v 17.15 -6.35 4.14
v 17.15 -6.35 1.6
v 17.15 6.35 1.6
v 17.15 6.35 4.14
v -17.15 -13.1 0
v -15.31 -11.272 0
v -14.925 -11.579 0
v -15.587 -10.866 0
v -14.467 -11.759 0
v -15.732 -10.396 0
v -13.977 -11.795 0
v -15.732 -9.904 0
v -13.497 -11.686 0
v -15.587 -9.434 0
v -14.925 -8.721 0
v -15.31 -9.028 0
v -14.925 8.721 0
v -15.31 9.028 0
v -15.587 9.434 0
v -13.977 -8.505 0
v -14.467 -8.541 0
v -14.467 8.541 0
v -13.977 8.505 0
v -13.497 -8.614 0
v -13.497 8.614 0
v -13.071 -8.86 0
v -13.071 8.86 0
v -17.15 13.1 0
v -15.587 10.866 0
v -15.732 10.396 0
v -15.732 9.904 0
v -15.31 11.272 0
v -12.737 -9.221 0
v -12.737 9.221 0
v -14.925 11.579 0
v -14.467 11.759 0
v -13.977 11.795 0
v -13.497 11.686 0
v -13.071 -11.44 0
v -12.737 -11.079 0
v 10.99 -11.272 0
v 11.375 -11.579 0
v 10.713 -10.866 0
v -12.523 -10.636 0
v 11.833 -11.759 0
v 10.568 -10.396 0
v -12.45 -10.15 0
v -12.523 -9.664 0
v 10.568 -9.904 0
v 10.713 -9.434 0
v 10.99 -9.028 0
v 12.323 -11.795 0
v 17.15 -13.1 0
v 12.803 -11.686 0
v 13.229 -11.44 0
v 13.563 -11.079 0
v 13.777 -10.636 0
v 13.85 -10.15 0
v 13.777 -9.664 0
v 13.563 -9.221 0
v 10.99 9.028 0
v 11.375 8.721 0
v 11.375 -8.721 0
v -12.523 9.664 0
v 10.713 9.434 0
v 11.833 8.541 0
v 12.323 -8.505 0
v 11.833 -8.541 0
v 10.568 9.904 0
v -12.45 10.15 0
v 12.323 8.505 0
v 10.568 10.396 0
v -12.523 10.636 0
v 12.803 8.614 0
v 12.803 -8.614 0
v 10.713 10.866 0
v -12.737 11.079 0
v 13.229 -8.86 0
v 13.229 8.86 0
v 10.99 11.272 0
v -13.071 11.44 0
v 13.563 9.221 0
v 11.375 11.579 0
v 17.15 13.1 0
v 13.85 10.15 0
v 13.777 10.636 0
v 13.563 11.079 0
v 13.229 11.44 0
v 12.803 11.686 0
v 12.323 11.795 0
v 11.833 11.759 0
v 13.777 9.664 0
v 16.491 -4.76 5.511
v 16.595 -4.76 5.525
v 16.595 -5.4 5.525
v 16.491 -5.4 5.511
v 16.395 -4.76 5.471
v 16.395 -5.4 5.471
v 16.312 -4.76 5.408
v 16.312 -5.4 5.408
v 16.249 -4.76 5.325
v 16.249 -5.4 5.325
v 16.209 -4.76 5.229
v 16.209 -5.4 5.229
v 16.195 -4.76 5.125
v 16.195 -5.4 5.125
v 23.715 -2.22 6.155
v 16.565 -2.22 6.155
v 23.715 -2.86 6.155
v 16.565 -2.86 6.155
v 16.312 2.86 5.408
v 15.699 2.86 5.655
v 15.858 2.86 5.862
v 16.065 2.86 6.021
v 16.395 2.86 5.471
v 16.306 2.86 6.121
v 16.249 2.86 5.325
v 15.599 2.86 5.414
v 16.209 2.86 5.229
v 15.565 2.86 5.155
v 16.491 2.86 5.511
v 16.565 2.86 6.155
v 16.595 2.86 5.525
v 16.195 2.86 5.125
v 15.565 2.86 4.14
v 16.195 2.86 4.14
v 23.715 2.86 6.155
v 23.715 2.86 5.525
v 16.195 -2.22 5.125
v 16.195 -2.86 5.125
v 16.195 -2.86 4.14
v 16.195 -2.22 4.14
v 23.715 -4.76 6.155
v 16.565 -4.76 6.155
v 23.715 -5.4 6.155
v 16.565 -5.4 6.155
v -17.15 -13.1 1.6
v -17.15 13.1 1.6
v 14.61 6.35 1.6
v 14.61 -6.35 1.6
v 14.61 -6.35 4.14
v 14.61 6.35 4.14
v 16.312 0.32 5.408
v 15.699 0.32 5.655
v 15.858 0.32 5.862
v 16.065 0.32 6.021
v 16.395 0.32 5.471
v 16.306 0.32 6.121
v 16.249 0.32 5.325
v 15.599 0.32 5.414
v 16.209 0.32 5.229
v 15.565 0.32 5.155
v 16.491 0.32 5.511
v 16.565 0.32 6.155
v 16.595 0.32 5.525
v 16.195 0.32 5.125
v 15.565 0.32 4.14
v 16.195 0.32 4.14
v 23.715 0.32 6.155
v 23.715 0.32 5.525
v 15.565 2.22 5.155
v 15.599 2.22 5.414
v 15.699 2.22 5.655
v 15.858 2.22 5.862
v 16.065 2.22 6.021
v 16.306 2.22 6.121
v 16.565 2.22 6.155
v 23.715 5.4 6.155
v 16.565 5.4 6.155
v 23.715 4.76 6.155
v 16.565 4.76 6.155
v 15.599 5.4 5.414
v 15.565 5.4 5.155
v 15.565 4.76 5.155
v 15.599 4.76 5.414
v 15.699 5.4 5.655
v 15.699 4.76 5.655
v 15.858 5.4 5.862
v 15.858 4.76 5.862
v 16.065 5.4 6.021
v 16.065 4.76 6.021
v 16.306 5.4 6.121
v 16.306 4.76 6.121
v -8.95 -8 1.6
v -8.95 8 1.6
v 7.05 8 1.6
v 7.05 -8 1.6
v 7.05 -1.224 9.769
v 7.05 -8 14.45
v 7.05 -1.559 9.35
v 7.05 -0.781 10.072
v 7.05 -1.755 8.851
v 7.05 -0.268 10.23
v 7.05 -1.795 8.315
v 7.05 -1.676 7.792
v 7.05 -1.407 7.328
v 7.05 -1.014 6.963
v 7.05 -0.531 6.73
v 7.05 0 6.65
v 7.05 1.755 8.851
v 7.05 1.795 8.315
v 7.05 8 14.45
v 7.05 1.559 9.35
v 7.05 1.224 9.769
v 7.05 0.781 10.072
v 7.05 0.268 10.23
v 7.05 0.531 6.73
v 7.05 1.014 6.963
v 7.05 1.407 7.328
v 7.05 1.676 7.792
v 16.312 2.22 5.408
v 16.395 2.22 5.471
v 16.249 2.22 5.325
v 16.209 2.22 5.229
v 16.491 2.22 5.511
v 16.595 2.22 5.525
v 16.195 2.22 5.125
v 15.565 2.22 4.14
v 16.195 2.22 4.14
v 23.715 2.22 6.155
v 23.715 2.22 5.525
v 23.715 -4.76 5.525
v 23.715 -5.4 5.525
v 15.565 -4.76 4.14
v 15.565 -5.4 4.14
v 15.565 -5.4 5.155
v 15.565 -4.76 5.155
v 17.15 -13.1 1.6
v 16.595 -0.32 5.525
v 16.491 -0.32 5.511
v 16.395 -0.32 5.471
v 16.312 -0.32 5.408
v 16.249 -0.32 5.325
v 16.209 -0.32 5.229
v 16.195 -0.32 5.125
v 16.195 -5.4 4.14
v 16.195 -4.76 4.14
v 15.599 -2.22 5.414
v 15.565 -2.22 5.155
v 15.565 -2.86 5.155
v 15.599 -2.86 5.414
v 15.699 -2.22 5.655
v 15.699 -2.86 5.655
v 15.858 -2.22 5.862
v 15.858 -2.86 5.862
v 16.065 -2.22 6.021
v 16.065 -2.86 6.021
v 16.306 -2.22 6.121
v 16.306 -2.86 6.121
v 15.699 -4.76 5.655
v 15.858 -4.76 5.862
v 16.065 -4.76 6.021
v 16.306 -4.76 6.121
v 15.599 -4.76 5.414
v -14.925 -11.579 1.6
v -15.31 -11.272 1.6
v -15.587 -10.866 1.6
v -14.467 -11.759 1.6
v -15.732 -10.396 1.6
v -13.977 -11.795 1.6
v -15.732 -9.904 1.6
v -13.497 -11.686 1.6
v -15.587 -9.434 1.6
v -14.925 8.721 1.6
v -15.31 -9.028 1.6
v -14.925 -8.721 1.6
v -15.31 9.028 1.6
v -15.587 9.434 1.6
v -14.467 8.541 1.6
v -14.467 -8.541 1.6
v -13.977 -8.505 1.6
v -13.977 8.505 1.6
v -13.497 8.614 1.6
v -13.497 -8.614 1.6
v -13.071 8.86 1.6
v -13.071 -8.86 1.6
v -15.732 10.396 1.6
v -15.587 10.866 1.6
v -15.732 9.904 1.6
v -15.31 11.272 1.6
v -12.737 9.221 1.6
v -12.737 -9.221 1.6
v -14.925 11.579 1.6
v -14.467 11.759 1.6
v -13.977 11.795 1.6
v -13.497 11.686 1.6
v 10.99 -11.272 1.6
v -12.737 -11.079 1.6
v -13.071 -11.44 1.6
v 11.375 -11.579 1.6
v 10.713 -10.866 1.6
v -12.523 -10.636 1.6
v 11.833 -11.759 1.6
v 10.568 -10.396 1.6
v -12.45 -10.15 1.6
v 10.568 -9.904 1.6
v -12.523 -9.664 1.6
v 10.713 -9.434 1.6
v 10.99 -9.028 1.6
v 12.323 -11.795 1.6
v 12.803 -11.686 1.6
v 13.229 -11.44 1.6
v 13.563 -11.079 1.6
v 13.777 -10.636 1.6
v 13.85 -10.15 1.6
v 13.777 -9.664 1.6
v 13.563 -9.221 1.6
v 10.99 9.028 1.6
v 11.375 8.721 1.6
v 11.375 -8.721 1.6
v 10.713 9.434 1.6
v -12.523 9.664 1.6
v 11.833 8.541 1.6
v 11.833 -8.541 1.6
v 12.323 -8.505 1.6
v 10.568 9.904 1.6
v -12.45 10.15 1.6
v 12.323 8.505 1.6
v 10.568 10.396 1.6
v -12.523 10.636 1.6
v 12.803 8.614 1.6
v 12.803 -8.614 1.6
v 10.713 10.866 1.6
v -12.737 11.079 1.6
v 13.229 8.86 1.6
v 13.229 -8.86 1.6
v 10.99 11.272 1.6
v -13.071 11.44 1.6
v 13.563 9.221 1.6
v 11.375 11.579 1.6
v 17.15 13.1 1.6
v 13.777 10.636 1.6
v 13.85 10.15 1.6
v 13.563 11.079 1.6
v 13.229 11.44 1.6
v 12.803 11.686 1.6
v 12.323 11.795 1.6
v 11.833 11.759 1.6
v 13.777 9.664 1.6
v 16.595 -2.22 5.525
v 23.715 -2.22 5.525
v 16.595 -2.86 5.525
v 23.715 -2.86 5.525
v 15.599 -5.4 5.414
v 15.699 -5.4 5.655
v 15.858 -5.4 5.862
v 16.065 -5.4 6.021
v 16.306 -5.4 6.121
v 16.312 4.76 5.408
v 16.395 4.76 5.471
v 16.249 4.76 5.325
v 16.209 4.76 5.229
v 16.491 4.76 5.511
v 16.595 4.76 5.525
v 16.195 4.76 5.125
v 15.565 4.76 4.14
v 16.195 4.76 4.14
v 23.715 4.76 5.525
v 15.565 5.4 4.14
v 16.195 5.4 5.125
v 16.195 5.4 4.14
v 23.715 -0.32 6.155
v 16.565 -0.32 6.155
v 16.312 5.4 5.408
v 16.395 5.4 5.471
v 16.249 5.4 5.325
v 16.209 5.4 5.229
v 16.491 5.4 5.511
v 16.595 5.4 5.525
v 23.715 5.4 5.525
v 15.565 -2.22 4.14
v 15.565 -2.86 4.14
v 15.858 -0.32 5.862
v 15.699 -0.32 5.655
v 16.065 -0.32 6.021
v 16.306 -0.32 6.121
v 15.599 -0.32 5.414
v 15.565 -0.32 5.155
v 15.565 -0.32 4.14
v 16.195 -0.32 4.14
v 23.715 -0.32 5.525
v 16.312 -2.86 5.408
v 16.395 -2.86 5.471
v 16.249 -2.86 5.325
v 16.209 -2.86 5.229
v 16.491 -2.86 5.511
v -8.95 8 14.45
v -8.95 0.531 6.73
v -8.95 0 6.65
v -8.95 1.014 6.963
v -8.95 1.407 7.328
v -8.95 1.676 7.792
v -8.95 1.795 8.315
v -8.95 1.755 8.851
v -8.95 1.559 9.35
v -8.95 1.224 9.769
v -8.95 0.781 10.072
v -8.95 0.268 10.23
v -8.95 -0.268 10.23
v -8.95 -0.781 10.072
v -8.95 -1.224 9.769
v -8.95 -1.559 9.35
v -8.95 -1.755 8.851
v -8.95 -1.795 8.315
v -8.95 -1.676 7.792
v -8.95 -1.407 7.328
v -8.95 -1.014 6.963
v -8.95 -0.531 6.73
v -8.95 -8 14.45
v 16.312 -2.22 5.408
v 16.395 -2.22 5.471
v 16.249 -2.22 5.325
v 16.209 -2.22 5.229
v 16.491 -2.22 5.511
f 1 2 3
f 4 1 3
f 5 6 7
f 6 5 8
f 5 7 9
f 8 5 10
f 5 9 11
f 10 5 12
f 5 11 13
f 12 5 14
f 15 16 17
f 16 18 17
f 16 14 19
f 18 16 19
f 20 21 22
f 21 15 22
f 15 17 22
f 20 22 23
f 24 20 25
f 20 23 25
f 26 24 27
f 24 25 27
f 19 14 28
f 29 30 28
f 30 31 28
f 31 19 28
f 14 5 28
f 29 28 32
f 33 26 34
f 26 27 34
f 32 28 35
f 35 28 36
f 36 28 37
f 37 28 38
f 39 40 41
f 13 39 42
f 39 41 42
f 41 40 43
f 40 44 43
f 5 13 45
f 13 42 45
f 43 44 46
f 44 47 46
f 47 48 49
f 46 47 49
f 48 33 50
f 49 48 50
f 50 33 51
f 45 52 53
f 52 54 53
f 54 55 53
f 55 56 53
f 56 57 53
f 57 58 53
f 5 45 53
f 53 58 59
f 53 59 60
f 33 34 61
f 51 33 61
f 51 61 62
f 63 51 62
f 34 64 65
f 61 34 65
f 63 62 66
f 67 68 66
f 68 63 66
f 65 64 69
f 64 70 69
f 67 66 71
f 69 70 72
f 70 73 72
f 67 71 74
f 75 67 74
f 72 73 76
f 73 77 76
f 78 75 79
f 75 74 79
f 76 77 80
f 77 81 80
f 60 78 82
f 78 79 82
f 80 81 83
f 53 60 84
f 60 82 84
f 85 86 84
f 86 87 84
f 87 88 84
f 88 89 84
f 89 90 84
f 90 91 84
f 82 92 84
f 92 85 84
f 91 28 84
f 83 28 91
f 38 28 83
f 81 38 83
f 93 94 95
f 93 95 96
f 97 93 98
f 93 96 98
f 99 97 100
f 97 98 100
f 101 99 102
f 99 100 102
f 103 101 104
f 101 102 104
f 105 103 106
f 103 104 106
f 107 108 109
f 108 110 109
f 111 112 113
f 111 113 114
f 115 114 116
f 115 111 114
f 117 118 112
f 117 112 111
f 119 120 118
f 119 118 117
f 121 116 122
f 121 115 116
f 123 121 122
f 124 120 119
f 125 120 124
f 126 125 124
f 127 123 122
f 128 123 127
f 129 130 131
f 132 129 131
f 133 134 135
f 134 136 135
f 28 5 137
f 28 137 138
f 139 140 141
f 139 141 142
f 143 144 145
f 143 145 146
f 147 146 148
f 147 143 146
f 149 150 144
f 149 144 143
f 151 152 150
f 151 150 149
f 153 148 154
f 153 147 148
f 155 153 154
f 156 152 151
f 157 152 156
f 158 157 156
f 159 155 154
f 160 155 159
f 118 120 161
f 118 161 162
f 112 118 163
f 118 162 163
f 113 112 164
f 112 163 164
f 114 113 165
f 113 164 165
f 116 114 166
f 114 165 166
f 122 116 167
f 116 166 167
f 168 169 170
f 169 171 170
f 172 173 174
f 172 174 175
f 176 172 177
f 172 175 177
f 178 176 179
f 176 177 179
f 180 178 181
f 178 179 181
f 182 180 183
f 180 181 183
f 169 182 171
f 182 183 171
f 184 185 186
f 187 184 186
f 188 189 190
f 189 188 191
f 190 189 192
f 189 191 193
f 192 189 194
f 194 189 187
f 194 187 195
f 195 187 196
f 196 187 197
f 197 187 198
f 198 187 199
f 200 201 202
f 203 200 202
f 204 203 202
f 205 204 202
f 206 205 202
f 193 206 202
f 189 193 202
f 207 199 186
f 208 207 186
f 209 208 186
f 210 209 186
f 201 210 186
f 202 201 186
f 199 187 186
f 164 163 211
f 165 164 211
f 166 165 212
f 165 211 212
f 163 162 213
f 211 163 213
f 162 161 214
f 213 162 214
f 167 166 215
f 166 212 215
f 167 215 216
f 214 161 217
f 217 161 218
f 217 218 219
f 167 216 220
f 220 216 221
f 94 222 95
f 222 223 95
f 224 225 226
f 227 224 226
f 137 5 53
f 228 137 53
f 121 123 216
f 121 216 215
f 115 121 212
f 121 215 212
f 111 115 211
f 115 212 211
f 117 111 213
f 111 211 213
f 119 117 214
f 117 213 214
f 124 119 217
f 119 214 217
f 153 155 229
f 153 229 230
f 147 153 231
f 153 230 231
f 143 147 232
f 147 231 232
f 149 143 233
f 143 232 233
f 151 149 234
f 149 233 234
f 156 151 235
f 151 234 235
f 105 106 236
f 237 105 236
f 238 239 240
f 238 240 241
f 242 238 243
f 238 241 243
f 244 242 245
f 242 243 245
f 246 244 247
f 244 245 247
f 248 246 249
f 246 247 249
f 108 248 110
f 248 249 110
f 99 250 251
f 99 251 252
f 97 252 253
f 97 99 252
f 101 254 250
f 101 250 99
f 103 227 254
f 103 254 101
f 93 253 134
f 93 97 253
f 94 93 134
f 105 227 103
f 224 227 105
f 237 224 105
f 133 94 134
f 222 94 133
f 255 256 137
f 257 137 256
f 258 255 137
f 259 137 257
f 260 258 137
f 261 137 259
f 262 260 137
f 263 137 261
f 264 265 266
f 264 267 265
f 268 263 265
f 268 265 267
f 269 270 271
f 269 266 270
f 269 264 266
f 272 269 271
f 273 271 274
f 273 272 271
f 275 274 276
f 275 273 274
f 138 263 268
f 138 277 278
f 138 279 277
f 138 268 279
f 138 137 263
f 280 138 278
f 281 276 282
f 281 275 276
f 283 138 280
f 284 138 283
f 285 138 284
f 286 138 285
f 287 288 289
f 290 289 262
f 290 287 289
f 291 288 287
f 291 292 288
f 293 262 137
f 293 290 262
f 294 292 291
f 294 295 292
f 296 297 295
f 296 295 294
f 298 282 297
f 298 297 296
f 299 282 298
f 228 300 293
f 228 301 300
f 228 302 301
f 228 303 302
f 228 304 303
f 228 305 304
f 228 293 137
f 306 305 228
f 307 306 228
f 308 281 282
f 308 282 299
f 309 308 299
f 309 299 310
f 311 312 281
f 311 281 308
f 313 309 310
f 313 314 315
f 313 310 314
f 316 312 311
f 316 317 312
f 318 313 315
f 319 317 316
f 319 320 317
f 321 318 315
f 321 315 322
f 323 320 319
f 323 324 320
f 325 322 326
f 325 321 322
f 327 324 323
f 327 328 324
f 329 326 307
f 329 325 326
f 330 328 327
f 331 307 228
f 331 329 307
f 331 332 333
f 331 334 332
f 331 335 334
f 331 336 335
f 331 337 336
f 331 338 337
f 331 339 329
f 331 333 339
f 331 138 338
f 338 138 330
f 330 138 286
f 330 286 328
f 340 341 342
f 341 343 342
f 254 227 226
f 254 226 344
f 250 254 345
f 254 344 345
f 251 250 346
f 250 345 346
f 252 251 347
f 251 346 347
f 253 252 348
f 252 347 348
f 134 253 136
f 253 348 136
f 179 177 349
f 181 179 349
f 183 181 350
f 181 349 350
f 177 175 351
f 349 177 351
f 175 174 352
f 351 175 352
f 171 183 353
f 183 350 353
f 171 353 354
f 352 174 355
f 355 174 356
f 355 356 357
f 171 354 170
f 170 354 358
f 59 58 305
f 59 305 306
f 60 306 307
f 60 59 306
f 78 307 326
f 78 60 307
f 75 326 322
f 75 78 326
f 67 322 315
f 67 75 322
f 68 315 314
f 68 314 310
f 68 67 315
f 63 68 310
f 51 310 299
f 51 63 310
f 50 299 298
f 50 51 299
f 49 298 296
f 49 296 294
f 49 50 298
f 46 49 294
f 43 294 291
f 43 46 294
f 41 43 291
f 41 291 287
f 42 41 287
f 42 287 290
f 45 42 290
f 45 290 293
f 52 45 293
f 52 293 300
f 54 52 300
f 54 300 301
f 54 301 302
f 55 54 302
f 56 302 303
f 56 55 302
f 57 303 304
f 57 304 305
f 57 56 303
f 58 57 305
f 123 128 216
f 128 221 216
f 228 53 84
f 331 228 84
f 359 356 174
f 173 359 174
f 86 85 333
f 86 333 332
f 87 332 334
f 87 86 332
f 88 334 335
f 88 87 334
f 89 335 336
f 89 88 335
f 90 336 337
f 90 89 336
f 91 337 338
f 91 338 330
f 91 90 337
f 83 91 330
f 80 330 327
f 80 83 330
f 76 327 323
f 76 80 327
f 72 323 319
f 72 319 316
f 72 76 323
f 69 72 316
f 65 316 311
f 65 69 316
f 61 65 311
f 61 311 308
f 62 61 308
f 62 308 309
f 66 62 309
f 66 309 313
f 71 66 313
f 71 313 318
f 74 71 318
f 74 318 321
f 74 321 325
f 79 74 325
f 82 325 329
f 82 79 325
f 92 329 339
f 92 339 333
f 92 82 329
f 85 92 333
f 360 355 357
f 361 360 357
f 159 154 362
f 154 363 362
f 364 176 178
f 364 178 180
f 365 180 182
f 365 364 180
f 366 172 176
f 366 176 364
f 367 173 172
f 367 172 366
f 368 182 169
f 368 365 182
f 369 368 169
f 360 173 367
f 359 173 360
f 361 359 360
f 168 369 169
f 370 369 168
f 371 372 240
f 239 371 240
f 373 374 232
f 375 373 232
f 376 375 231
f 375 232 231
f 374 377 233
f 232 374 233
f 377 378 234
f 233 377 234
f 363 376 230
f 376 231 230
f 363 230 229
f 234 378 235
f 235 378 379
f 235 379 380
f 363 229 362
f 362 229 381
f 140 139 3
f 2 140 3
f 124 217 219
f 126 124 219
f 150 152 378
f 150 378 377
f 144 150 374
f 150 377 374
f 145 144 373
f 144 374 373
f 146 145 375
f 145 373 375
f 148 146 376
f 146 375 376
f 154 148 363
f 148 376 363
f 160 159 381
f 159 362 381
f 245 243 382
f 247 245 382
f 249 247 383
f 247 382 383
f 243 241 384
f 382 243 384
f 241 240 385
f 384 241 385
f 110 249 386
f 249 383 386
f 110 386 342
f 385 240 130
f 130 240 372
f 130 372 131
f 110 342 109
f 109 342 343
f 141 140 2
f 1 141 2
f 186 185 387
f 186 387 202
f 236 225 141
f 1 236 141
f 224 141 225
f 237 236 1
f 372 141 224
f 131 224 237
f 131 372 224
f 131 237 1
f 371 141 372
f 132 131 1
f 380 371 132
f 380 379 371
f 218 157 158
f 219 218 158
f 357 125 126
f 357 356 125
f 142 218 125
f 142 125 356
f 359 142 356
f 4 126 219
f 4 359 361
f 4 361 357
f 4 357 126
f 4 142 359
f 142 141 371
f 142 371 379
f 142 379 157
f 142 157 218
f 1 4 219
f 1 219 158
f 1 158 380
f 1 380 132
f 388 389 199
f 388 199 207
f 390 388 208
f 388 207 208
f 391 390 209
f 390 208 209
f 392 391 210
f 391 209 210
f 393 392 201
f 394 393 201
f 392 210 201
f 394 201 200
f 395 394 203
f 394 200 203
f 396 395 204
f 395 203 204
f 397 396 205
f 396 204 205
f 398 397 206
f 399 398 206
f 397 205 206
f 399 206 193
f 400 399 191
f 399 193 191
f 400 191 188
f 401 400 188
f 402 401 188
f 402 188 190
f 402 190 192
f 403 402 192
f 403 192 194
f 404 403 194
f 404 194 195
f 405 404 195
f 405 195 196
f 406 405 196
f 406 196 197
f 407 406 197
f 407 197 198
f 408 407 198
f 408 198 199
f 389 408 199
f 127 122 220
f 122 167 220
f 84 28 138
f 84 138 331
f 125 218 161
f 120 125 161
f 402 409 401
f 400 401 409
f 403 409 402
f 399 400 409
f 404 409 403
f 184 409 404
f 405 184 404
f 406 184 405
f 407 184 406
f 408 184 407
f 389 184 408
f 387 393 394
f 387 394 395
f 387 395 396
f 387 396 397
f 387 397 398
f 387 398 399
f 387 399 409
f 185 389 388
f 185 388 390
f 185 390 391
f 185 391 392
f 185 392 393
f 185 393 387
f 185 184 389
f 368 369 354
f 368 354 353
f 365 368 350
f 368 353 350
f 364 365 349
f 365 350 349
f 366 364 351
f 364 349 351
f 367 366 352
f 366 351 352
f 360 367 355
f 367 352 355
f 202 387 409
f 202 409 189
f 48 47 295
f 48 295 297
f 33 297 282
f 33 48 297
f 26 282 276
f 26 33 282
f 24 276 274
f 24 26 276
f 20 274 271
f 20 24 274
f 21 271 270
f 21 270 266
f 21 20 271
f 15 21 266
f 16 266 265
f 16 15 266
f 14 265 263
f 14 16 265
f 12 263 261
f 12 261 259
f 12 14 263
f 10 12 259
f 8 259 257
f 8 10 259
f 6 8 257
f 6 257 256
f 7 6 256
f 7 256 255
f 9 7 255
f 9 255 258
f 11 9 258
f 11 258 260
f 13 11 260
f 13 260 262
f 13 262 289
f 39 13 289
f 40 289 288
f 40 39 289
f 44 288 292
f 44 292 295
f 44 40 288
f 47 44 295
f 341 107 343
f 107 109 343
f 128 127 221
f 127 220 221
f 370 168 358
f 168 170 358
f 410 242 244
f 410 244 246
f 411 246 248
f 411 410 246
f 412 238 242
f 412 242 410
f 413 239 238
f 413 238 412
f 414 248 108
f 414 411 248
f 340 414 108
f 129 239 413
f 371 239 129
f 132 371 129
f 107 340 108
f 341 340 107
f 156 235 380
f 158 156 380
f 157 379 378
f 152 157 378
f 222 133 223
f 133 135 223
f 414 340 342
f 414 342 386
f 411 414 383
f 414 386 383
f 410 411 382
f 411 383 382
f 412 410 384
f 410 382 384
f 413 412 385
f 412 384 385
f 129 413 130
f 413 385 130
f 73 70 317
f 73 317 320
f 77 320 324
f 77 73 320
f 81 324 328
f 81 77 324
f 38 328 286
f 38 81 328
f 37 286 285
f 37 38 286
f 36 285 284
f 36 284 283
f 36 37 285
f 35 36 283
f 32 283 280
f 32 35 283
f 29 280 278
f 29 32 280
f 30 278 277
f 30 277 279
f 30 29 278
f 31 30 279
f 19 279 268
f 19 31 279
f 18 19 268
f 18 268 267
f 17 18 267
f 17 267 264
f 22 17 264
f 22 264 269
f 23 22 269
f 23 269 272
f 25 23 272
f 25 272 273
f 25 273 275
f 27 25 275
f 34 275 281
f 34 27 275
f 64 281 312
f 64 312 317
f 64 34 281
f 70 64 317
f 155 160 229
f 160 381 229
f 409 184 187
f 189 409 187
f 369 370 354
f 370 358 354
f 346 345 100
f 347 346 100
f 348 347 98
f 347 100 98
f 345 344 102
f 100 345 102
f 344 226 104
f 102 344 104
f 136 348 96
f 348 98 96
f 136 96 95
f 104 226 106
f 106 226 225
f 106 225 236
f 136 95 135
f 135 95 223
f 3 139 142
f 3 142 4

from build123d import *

# Parameters (mm, degrees)
SKETCH1_W             = 34.3
SKETCH1_H             = 26.2
SKETCH1_R             = 1.65
PCB_DEPTH             = 1.6
SKETCH2_W             = 16
SKETCH2_H             = 16
POTENTIOMETERS_DEPTH  = 12.85
SKETCH4_R             = 1.8
ROTATION_AXIS_DEPTH   = 32.081385104
SKETCH5_W             = 2.54
SKETCH5_H             = 12.7
HEADER_BASE_DEPTH     = 2.54
RIGHT_ANGLE_PIN_DEPTH = 0.32
LPATTERN1_COUNT       = 5
LPATTERN1_PITCH       = 2.54


with BuildPart() as part:
    # Sketch1 → PCB (new body)
    with BuildSketch(Plane.XY):
        Rectangle(SKETCH1_W, SKETCH1_H)
        with Locations((-14.1, 10.15)):
            Circle(SKETCH1_R, mode=Mode.SUBTRACT)
        with Locations((12.2, 10.15)):
            Circle(SKETCH1_R, mode=Mode.SUBTRACT)
        with Locations((12.2, -10.15)):
            Circle(SKETCH1_R, mode=Mode.SUBTRACT)
        with Locations((-14.1, -10.15)):
            Circle(SKETCH1_R, mode=Mode.SUBTRACT)
    extrude(amount=PCB_DEPTH)


with BuildPart() as body_2:
    # Sketch2 → Potentiometers (new body)
    with BuildSketch(Plane.XY.offset(1.6)):
        with Locations((-0.95, 0)):
            Rectangle(SKETCH2_W, SKETCH2_H)
    extrude(amount=POTENTIOMETERS_DEPTH)

    # Sketch4 → Rotation Axis (cut, through all)
    with BuildSketch(Plane(origin=(7.05, 0, 0), x_dir=(0, 0, -1), z_dir=(1, 0, 0))):
        with Locations((-8.45, 0)):
            Circle(SKETCH4_R)
    extrude(amount=-ROTATION_AXIS_DEPTH, mode=Mode.SUBTRACT)


with BuildPart() as body_3:
    # Sketch5 → Header Base (new body)
    with BuildSketch(Plane.XY.offset(1.6)):
        with Locations((15.88, 0)):
            Rectangle(SKETCH5_W, SKETCH5_H)
    extrude(amount=HEADER_BASE_DEPTH)

    # Sketch6 → Right Angle Pin (add, symmetric)
    with BuildSketch(Plane(origin=(0, -5.08, 0), x_dir=(-1, 0, 0), z_dir=(0, -1, 0))):
        with BuildLine():
            Line((-15.565, -4.14), (-15.565, -5.155))
            ThreePointArc((-15.565, -5.155), (-15.857893219, -5.862106781), (-16.565, -6.155))
            Line((-16.565, -6.155), (-23.715, -6.155))
            Line((-23.715, -6.155), (-23.715, -5.525))
            Line((-23.715, -5.525), (-16.595, -5.525))
            ThreePointArc((-16.595, -5.525), (-16.312157288, -5.407842712), (-16.195, -5.125))
            Line((-16.195, -5.125), (-16.195, -4.14))
            Line((-16.195, -4.14), (-15.565, -4.14))
        make_face()
    right_angle_pin = extrude(amount=RIGHT_ANGLE_PIN_DEPTH, both=True)

    # LPattern1: Right Angle Pin ×5
    with Locations(*[(0, i * LPATTERN1_PITCH, 0) for i in range(1, LPATTERN1_COUNT)]):
        add(right_angle_pin)


solid = Compound([part.part, body_2.part, body_3.part])
